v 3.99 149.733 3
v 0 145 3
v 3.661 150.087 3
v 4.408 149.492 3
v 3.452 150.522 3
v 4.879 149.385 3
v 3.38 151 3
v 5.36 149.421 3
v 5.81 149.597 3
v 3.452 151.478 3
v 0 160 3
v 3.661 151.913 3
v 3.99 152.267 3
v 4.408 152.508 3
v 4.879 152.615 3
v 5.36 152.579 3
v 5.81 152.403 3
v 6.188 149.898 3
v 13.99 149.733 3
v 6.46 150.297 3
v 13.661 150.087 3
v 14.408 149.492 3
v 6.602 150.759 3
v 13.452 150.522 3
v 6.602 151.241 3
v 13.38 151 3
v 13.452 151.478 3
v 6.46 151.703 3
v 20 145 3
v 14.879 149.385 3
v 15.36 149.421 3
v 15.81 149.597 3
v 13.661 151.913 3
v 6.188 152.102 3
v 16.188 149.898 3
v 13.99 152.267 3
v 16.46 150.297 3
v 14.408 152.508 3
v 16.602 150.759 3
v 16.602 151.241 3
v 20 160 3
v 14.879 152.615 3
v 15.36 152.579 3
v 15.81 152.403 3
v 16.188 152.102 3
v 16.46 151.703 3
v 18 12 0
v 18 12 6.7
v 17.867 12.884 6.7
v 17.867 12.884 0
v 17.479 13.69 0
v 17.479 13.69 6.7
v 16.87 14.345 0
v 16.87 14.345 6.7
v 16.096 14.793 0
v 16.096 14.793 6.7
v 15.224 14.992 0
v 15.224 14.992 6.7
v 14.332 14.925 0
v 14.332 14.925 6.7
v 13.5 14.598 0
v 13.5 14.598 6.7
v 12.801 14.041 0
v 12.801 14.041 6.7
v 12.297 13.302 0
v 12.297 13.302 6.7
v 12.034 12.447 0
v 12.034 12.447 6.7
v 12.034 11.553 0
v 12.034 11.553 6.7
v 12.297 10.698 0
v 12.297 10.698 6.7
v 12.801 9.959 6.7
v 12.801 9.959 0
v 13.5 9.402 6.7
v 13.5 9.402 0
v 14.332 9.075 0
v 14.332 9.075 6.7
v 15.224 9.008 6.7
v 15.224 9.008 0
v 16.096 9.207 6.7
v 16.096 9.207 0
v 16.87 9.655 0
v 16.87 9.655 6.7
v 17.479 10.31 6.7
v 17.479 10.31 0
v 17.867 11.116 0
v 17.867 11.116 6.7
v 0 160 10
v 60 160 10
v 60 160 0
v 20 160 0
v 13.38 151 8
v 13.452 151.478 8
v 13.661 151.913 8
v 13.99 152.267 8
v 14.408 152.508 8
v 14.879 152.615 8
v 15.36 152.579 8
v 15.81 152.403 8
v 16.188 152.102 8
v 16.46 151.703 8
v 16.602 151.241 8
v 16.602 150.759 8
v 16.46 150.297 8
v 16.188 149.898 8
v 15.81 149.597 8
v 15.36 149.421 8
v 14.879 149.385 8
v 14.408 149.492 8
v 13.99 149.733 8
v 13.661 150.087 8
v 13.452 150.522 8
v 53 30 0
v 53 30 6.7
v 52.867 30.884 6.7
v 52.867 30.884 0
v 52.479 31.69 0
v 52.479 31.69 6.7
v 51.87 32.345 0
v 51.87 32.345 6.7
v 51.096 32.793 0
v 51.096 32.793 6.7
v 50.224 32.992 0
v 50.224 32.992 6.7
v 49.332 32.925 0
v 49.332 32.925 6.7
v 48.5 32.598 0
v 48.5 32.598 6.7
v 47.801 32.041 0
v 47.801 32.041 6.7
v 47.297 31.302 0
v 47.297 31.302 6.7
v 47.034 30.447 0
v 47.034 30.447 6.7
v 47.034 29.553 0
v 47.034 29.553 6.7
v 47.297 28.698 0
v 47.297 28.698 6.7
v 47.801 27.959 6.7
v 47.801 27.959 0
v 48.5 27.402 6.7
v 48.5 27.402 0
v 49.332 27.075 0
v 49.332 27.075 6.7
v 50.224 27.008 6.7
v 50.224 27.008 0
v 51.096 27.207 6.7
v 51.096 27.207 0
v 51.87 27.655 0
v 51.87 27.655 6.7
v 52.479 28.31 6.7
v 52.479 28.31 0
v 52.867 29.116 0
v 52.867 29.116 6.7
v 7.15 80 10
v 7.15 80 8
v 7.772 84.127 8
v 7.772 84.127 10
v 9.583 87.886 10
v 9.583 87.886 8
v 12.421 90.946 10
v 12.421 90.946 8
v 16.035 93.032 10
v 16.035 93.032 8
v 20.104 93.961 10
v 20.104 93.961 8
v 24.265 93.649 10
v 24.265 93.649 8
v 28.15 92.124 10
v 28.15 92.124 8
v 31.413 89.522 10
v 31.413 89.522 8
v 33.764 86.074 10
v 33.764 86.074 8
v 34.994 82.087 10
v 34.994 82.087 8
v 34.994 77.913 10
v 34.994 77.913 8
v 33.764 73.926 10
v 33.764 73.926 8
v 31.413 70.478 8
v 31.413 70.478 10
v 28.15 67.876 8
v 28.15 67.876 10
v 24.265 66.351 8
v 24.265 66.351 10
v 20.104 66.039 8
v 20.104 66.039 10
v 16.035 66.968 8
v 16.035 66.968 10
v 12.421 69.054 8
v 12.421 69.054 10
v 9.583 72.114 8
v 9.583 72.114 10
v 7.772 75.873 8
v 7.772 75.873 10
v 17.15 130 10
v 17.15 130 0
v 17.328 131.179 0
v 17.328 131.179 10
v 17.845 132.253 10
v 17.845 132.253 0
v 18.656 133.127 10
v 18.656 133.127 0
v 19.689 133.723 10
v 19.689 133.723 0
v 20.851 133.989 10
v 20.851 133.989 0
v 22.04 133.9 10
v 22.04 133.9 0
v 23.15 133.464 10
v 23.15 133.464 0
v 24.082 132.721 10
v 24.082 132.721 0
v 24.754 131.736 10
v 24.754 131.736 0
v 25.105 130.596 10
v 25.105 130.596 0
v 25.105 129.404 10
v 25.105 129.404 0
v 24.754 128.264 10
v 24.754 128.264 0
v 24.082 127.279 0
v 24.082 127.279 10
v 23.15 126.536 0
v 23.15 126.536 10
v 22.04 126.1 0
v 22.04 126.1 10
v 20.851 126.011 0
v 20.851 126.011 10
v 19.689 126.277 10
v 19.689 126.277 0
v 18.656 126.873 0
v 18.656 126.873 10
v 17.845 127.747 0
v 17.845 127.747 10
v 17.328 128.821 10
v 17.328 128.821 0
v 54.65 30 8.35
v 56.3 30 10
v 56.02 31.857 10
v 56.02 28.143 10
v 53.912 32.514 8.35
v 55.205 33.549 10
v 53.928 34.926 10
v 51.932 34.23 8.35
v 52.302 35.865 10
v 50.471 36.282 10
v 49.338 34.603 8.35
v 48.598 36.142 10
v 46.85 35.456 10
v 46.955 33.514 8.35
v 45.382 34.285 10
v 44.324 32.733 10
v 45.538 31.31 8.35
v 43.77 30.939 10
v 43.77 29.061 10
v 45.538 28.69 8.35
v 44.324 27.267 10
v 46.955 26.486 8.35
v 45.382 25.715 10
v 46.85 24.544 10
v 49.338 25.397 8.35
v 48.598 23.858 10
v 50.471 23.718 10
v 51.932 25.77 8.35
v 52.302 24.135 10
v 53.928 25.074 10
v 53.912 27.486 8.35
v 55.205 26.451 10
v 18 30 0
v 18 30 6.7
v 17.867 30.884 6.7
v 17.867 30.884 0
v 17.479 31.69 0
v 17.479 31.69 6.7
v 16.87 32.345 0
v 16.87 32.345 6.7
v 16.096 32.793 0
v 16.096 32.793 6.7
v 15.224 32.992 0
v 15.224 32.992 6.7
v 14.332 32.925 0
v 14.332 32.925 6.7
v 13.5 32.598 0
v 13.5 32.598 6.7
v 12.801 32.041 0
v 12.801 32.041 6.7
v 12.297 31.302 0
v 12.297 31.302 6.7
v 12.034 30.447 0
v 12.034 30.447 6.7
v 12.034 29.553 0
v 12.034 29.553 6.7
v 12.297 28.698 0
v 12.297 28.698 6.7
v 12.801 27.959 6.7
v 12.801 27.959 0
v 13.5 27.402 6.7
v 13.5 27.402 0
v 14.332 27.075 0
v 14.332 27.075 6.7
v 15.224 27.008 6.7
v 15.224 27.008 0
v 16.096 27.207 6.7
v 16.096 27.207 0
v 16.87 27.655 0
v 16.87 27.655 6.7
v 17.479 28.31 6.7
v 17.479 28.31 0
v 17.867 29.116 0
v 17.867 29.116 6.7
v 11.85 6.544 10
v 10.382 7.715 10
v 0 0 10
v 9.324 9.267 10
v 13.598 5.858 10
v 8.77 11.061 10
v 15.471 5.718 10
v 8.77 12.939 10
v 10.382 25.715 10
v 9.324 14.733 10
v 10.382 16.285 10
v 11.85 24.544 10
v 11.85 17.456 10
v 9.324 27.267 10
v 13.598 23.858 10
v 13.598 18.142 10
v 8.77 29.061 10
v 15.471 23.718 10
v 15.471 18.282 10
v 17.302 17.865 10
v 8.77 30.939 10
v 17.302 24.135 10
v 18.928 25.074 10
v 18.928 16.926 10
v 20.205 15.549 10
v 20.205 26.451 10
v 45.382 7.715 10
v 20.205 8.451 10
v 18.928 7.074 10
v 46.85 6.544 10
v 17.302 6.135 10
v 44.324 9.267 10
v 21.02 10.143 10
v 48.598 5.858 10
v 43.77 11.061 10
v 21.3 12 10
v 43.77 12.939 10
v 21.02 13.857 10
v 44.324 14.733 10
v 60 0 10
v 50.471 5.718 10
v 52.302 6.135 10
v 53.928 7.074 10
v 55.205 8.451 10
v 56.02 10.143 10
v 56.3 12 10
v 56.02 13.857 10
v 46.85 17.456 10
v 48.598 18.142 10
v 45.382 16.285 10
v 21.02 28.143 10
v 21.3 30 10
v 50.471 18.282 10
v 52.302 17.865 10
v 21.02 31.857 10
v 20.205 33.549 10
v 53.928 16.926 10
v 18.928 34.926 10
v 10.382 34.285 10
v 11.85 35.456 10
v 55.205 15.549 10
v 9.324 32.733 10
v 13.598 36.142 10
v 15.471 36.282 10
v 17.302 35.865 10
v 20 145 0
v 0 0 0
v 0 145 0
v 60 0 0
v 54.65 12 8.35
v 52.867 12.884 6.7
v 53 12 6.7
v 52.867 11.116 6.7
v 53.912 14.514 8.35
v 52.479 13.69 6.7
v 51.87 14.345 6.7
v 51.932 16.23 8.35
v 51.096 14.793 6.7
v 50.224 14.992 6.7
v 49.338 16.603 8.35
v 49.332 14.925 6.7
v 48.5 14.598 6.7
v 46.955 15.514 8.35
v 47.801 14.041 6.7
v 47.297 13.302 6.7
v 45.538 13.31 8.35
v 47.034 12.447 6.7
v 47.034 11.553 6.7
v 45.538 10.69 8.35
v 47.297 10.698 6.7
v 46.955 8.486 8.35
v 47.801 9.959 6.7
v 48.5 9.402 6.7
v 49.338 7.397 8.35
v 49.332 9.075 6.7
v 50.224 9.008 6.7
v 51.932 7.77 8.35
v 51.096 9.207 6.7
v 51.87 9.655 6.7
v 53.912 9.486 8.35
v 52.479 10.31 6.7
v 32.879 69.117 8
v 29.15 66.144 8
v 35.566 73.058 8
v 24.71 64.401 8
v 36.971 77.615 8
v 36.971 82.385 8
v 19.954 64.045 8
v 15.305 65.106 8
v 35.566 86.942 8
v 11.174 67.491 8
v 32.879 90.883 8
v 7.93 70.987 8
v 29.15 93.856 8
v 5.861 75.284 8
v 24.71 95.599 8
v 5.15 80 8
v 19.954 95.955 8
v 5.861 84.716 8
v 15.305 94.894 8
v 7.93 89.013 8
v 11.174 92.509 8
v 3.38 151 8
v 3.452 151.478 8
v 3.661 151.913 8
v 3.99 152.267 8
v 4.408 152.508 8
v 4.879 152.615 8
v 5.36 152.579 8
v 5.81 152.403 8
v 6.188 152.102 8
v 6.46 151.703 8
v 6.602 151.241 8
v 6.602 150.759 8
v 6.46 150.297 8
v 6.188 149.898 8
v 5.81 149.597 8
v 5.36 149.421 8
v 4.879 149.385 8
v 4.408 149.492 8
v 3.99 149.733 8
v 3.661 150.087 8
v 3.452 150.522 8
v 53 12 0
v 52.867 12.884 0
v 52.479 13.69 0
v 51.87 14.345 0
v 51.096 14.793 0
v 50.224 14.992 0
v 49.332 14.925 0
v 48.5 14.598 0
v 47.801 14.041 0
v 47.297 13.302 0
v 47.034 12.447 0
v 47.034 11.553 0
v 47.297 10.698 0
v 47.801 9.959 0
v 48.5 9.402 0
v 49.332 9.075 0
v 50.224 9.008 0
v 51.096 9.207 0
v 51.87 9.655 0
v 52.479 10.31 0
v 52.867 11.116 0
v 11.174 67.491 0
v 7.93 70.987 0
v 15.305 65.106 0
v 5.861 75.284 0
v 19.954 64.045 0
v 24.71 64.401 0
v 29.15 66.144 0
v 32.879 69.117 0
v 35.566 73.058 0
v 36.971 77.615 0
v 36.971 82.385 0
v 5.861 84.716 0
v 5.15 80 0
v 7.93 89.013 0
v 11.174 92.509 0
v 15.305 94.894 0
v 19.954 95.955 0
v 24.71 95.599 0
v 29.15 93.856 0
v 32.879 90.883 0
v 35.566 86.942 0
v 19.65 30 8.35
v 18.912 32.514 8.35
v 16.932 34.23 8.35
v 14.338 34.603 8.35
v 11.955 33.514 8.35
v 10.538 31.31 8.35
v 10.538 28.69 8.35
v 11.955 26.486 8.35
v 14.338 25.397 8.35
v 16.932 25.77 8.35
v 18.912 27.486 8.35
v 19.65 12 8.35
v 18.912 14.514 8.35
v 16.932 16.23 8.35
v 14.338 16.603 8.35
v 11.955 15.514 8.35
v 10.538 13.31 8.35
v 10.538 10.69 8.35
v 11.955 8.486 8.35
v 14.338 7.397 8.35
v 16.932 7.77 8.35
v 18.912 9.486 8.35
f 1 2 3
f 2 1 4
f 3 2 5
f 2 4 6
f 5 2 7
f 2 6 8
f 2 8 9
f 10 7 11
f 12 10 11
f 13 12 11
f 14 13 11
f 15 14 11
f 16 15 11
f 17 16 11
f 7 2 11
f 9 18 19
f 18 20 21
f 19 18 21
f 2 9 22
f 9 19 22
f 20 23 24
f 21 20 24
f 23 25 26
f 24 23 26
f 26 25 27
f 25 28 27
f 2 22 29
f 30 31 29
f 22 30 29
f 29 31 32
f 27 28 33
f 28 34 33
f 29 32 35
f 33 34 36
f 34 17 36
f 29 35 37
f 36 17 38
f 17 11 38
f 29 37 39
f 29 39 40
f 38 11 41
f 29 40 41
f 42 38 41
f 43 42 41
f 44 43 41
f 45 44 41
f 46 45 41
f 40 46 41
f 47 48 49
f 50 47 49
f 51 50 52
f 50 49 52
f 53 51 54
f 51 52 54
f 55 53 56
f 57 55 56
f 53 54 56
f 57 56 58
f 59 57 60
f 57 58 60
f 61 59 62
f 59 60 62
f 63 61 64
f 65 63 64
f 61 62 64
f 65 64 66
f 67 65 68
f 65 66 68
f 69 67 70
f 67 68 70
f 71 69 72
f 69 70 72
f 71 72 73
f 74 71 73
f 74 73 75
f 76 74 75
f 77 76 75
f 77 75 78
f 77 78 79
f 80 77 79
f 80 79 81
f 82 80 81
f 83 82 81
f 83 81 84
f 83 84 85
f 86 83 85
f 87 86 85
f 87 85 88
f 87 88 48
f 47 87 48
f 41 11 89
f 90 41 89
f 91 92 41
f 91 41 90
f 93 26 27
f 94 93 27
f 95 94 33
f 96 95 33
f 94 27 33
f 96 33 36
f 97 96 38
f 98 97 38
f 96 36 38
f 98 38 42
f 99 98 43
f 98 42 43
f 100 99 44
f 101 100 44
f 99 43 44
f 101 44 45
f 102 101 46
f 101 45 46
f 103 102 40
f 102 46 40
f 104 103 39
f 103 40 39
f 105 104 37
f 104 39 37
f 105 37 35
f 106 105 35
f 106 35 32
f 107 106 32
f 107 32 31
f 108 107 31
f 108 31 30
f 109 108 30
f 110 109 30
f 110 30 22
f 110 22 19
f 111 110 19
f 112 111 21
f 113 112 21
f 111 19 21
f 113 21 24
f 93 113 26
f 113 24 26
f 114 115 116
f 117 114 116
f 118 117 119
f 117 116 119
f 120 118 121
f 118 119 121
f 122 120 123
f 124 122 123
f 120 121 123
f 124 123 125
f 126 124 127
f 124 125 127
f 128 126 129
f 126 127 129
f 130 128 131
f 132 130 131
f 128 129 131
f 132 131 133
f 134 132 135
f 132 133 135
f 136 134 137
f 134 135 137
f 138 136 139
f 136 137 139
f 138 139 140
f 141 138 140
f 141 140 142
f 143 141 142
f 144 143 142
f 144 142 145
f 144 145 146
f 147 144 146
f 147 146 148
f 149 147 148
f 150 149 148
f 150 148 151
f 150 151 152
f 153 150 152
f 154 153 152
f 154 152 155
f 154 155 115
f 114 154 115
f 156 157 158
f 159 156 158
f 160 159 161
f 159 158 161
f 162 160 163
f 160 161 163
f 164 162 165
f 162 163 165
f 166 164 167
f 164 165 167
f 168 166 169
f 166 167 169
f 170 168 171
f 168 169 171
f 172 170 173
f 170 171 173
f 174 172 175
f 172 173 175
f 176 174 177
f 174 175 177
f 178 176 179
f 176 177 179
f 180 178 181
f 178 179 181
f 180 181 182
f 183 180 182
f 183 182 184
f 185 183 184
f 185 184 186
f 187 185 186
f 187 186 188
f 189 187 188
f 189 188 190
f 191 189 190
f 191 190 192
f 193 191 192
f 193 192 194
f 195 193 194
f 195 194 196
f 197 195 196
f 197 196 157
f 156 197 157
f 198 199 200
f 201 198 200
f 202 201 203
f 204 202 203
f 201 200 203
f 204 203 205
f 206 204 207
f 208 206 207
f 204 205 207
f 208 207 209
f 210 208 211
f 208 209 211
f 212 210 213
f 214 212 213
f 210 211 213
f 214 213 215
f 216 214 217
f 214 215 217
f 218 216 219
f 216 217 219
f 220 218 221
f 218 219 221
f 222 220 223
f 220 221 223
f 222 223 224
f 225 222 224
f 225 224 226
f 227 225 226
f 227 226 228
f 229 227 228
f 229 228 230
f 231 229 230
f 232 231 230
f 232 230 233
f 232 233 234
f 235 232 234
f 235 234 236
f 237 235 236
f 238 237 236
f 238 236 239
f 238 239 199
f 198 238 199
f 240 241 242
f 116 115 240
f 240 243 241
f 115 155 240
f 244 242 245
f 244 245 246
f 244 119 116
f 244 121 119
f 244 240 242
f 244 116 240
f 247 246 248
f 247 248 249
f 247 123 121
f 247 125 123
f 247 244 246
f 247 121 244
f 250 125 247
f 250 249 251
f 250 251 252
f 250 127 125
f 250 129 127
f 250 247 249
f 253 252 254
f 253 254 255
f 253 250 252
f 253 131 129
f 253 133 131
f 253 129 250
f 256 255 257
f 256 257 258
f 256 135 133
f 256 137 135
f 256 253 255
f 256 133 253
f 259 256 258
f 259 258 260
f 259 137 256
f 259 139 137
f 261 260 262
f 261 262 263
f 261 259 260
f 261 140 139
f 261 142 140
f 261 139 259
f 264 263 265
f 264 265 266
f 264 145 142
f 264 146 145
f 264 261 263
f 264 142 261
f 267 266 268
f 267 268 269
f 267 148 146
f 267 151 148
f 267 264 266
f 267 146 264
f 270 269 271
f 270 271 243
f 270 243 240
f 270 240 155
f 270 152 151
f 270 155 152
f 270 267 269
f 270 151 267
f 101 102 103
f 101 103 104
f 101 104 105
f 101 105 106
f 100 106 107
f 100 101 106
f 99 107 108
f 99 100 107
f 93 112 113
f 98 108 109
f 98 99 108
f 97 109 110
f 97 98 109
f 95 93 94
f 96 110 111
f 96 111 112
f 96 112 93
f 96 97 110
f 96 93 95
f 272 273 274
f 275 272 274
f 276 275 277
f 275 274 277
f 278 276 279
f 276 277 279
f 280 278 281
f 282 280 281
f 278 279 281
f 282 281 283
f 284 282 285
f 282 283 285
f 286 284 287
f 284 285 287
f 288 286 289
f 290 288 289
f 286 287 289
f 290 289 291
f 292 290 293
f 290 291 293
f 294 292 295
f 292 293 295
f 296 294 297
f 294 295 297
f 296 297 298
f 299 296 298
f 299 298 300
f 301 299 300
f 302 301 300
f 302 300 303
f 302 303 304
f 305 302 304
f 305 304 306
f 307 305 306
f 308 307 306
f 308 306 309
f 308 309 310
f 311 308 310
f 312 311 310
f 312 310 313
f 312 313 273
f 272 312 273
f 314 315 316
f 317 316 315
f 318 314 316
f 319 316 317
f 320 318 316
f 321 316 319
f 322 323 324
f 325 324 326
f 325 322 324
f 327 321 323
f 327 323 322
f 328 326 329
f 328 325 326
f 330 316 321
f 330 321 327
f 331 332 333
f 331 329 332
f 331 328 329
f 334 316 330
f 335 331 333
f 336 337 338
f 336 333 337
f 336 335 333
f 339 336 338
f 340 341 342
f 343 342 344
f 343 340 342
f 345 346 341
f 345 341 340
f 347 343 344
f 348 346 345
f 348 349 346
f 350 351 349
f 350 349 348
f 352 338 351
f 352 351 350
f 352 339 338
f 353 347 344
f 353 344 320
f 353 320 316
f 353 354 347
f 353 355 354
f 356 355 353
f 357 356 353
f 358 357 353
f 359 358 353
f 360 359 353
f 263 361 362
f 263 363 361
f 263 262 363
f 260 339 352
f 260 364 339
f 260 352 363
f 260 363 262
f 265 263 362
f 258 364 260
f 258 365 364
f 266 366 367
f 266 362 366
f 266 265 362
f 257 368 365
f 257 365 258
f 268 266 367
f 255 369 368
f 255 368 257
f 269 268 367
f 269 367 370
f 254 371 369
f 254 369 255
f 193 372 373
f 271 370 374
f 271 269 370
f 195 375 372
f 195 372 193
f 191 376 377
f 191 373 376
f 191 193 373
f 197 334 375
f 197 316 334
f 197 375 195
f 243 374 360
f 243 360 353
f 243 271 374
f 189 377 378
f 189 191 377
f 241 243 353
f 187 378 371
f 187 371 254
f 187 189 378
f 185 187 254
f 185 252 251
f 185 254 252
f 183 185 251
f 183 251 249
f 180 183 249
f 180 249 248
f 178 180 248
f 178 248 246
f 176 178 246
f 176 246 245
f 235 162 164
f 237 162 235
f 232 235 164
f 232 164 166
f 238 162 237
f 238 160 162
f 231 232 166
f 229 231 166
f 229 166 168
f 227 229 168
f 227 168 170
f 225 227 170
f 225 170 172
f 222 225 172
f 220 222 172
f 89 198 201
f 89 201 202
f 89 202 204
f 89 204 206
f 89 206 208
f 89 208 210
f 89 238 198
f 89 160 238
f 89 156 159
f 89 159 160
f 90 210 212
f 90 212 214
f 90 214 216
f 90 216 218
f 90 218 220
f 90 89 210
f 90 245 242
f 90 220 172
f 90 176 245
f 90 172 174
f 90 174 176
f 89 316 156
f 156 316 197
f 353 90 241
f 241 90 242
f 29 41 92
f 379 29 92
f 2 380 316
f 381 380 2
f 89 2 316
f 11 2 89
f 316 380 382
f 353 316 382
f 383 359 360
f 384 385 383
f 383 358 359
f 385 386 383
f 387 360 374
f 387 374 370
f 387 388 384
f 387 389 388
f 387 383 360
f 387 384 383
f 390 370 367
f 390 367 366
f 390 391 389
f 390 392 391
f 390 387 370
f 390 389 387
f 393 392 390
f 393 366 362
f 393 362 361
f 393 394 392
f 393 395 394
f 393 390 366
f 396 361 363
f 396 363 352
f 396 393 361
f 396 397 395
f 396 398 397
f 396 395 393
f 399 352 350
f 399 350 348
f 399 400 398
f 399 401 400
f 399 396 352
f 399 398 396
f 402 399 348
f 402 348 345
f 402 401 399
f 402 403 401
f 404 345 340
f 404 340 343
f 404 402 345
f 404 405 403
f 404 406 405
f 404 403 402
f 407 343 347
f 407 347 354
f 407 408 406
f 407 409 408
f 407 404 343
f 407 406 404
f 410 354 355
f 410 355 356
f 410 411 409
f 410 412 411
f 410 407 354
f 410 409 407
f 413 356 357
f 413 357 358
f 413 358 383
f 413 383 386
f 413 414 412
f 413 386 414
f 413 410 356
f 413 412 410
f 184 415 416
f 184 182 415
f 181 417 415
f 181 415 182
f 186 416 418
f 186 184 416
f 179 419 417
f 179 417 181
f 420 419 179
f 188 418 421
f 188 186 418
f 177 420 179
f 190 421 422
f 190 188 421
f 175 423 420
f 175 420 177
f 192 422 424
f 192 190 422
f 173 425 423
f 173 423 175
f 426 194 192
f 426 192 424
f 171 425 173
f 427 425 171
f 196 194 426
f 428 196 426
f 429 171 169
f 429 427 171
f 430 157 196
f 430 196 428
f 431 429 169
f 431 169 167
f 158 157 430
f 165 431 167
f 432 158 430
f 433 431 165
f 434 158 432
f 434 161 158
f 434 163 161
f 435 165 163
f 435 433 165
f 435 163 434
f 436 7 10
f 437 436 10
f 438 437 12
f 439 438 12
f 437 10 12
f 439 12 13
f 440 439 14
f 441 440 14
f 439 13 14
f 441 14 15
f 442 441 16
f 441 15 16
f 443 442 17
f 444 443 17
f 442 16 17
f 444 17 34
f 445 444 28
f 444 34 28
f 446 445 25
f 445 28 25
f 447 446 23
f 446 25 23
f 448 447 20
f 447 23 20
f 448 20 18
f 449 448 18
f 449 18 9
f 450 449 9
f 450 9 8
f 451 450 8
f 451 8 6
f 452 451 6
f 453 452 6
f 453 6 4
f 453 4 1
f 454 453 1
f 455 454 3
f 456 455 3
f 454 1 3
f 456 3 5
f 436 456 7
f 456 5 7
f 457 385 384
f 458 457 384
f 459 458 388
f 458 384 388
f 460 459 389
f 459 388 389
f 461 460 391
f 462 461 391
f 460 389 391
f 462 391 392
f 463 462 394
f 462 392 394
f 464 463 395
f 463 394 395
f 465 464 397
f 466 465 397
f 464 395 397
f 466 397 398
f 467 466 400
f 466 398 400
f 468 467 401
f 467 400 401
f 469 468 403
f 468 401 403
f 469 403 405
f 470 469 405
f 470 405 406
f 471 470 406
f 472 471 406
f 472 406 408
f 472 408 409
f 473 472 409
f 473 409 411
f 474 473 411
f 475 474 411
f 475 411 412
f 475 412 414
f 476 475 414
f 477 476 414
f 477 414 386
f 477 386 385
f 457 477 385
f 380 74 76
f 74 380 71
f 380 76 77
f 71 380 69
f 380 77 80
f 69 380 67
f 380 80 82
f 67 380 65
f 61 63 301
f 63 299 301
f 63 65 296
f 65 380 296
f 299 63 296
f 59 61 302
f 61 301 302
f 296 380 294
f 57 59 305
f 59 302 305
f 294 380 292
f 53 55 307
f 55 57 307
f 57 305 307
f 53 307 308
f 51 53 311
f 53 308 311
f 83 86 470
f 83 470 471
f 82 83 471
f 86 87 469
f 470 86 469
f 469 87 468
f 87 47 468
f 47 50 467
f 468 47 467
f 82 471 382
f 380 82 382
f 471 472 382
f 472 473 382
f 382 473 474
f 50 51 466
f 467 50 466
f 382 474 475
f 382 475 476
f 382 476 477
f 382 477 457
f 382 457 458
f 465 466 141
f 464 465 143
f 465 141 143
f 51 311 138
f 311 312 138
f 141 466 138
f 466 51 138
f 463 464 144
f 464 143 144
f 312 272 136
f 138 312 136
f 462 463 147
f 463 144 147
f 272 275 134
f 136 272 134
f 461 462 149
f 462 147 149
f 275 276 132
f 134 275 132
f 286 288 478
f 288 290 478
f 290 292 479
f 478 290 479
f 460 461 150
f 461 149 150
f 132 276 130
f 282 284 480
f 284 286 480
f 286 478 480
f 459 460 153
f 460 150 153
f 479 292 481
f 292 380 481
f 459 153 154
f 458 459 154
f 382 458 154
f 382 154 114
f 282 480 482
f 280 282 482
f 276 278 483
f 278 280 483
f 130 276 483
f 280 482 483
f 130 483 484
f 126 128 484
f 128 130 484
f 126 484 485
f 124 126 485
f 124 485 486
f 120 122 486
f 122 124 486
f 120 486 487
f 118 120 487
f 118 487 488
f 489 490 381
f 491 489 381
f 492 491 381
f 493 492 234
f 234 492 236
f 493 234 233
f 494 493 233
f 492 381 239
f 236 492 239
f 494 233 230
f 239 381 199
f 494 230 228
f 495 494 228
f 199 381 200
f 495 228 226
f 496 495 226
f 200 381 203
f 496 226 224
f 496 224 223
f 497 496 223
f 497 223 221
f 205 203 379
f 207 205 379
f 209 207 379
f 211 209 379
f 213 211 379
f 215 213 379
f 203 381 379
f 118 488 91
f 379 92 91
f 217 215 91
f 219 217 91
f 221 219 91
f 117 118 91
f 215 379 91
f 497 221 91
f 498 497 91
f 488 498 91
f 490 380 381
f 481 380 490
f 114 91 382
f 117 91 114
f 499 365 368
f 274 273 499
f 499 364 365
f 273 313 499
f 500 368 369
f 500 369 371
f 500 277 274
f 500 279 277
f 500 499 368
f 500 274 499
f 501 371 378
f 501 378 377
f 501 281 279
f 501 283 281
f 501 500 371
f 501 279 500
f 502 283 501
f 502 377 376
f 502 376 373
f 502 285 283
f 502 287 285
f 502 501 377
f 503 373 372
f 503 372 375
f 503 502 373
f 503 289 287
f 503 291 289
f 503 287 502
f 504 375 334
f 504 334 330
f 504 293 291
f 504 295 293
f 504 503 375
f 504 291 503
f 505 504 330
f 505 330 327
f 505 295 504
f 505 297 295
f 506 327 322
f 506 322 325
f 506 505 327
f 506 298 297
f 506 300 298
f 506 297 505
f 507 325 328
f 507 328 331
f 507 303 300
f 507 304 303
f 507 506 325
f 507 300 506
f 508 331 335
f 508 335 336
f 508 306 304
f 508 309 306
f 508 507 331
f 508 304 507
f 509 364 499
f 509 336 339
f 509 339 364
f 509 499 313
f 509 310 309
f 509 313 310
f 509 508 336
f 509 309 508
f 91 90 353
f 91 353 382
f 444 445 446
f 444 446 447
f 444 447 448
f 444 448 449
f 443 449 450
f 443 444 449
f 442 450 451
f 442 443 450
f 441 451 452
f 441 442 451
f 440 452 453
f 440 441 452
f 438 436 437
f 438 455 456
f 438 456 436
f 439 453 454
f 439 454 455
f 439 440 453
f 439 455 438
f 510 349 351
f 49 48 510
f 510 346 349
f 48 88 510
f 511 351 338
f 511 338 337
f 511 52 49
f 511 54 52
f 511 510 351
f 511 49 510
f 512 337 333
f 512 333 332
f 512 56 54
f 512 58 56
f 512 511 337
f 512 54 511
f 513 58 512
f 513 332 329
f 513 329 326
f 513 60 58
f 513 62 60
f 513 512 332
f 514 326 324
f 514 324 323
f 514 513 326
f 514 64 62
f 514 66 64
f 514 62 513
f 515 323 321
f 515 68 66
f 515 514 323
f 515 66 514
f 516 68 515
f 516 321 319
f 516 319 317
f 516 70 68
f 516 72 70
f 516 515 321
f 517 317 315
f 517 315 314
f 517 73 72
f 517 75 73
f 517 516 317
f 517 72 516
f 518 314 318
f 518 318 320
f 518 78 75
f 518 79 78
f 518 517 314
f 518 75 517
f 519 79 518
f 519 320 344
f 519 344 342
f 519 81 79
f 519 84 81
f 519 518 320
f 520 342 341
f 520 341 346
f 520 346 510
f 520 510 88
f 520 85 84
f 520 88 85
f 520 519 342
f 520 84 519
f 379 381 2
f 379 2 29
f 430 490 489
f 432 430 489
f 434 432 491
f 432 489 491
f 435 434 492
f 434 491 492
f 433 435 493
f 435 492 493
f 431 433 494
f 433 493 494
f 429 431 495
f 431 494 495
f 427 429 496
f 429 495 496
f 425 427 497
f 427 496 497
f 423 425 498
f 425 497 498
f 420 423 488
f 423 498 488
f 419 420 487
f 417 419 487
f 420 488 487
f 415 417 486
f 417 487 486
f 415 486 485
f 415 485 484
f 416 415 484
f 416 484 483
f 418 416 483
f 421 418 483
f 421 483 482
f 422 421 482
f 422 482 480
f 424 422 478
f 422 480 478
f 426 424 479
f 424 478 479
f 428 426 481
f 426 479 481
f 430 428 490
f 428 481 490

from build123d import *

# Parameters (mm, degrees)
SKIZZE1_W                        = 65
SKIZZE1_H                        = 160
AUFSATZ_LINEAR_AUSTRAGEN1_DEPTH  = 10
SKIZZE2_R                        = 16
SCHNITT_LINEAR_AUSTRAGEN1_DEPTH  = 8
SKIZZE3_W                        = 20
SKIZZE3_H                        = 3
SCHNITT_LINEAR_AUSTRAGEN2_DEPTH  = 15
SKIZZE4_R                        = 4
SCHNITT_LINEAR_AUSTRAGEN3_DEPTH  = 20
SKIZZE6_R                        = 14
SCHNITT_LINEAR_AUSTRAGEN4_DEPTH  = 20
SKIZZE7_R                        = 1.62
SCHNITT_LINEAR_AUSTRAGEN5_DEPTH  = 5
SKIZZE8_R                        = 1.62
SCHNITT_LINEAR_AUSTRAGEN6_DEPTH  = 5
SKIZZE9_R                        = 3
SCHNITT_LINEAR_AUSTRAGEN7_DEPTH  = 32
FASE1_SIZE                       = 3.3
SKIZZE10_R                       = 3
SCHNITT_LINEAR_AUSTRAGEN8_DEPTH  = 32
FASE2_SIZE                       = 3.3
SKIZZE11_R                       = 3
SCHNITT_LINEAR_AUSTRAGEN9_DEPTH  = 32
FASE3_SIZE                       = 3.3
SKIZZE12_R                       = 3
SCHNITT_LINEAR_AUSTRAGEN10_DEPTH = 25
FASE4_SIZE                       = 3.3
SKIZZE13_W                       = 10
SKIZZE13_H                       = 160
SCHNITT_LINEAR_AUSTRAGEN11_DEPTH = 5


with BuildPart() as part:
    # Skizze1 → Aufsatz-Linear austragen1 (new body)
    with BuildSketch(Plane.XY):
        with Locations((32.5, 80)):
            Rectangle(SKIZZE1_W, SKIZZE1_H)
    extrude(amount=AUFSATZ_LINEAR_AUSTRAGEN1_DEPTH)

    # Skizze2 → Schnitt-Linear austragen1 (cut)
    with BuildSketch(Plane(origin=(0, 0, 0), x_dir=(-1, 0, 0), z_dir=(0, 0, -1))):
        with Locations((-21.15, 80)):
            Circle(SKIZZE2_R)
    extrude(amount=-SCHNITT_LINEAR_AUSTRAGEN1_DEPTH, mode=Mode.SUBTRACT)

    # Skizze3 → Schnitt-Linear austragen2 (cut)
    with BuildSketch(Plane(origin=(0, 160, 0), x_dir=(1, 0, 0), z_dir=(0, 1, 0))):
        with Locations((10, -1.5)):
            Rectangle(SKIZZE3_W, SKIZZE3_H)
    extrude(amount=-SCHNITT_LINEAR_AUSTRAGEN2_DEPTH, mode=Mode.SUBTRACT)

    # Skizze4 → Schnitt-Linear austragen3 (cut)
    with BuildSketch(Plane(origin=(0, 0, 0), x_dir=(-1, 0, 0), z_dir=(0, 0, -1))):
        with Locations((-21.15, 130)):
            Circle(SKIZZE4_R)
    extrude(amount=-SCHNITT_LINEAR_AUSTRAGEN3_DEPTH, mode=Mode.SUBTRACT)

    # Skizze6 → Schnitt-Linear austragen4 (cut)
    with BuildSketch(Plane(origin=(0, 0, 8), x_dir=(-1, 0, 0), z_dir=(0, 0, -1))):
        with Locations((-21.15, 80)):
            Circle(SKIZZE6_R)
    extrude(amount=-SCHNITT_LINEAR_AUSTRAGEN4_DEPTH, mode=Mode.SUBTRACT)

    # Skizze7 → Schnitt-Linear austragen5 (cut)
    with BuildSketch(Plane(origin=(0, 0, 3), x_dir=(-1, 0, 0), z_dir=(0, 0, -1))):
        with Locations((-5, 151)):
            Circle(SKIZZE7_R)
    extrude(amount=-SCHNITT_LINEAR_AUSTRAGEN5_DEPTH, mode=Mode.SUBTRACT)

    # Skizze8 → Schnitt-Linear austragen6 (cut)
    with BuildSketch(Plane(origin=(0, 0, 3), x_dir=(-1, 0, 0), z_dir=(0, 0, -1))):
        with Locations((-15, 151)):
            Circle(SKIZZE8_R)
    extrude(amount=-SCHNITT_LINEAR_AUSTRAGEN6_DEPTH, mode=Mode.SUBTRACT)

    # Skizze9 → Schnitt-Linear austragen7 (cut)
    with BuildSketch(Plane.XY.offset(10)):
        with Locations((15, 12)):
            Circle(SKIZZE9_R)
    extrude(amount=-SCHNITT_LINEAR_AUSTRAGEN7_DEPTH, mode=Mode.SUBTRACT)

    # Fase1
    fase1_edges = [part.edges().sort_by_distance(p)[0] for p in [
        (12, 12, 10),
    ]]
    chamfer(fase1_edges, length=FASE1_SIZE)

    # Skizze10 → Schnitt-Linear austragen8 (cut)
    with BuildSketch(Plane.XY.offset(10)):
        with Locations((50, 12)):
            Circle(SKIZZE10_R)
    extrude(amount=-SCHNITT_LINEAR_AUSTRAGEN8_DEPTH, mode=Mode.SUBTRACT)

    # Fase2
    fase2_edges = [part.edges().sort_by_distance(p)[0] for p in [
        (47, 12, 10),
    ]]
    chamfer(fase2_edges, length=FASE2_SIZE)

    # Skizze11 → Schnitt-Linear austragen9 (cut)
    with BuildSketch(Plane.XY.offset(10)):
        with Locations((15, 30)):
            Circle(SKIZZE11_R)
    extrude(amount=-SCHNITT_LINEAR_AUSTRAGEN9_DEPTH, mode=Mode.SUBTRACT)

    # Fase3
    fase3_edges = [part.edges().sort_by_distance(p)[0] for p in [
        (12, 30, 10),
    ]]
    chamfer(fase3_edges, length=FASE3_SIZE)

    # Skizze12 → Schnitt-Linear austragen10 (cut)
    with BuildSketch(Plane.XY.offset(10)):
        with Locations((50, 30)):
            Circle(SKIZZE12_R)
    extrude(amount=-SCHNITT_LINEAR_AUSTRAGEN10_DEPTH, mode=Mode.SUBTRACT)

    # Fase4
    fase4_edges = [part.edges().sort_by_distance(p)[0] for p in [
        (47, 30, 10),
    ]]
    chamfer(fase4_edges, length=FASE4_SIZE)

    # Skizze13 → Schnitt-Linear austragen11 (cut)
    with BuildSketch(Plane(origin=(65, 0, 0), x_dir=(0, 0, -1), z_dir=(1, 0, 0))):
        with Locations((-5, 80)):
            Rectangle(SKIZZE13_W, SKIZZE13_H)
    extrude(amount=-SCHNITT_LINEAR_AUSTRAGEN11_DEPTH, mode=Mode.SUBTRACT)


solid = part.part
